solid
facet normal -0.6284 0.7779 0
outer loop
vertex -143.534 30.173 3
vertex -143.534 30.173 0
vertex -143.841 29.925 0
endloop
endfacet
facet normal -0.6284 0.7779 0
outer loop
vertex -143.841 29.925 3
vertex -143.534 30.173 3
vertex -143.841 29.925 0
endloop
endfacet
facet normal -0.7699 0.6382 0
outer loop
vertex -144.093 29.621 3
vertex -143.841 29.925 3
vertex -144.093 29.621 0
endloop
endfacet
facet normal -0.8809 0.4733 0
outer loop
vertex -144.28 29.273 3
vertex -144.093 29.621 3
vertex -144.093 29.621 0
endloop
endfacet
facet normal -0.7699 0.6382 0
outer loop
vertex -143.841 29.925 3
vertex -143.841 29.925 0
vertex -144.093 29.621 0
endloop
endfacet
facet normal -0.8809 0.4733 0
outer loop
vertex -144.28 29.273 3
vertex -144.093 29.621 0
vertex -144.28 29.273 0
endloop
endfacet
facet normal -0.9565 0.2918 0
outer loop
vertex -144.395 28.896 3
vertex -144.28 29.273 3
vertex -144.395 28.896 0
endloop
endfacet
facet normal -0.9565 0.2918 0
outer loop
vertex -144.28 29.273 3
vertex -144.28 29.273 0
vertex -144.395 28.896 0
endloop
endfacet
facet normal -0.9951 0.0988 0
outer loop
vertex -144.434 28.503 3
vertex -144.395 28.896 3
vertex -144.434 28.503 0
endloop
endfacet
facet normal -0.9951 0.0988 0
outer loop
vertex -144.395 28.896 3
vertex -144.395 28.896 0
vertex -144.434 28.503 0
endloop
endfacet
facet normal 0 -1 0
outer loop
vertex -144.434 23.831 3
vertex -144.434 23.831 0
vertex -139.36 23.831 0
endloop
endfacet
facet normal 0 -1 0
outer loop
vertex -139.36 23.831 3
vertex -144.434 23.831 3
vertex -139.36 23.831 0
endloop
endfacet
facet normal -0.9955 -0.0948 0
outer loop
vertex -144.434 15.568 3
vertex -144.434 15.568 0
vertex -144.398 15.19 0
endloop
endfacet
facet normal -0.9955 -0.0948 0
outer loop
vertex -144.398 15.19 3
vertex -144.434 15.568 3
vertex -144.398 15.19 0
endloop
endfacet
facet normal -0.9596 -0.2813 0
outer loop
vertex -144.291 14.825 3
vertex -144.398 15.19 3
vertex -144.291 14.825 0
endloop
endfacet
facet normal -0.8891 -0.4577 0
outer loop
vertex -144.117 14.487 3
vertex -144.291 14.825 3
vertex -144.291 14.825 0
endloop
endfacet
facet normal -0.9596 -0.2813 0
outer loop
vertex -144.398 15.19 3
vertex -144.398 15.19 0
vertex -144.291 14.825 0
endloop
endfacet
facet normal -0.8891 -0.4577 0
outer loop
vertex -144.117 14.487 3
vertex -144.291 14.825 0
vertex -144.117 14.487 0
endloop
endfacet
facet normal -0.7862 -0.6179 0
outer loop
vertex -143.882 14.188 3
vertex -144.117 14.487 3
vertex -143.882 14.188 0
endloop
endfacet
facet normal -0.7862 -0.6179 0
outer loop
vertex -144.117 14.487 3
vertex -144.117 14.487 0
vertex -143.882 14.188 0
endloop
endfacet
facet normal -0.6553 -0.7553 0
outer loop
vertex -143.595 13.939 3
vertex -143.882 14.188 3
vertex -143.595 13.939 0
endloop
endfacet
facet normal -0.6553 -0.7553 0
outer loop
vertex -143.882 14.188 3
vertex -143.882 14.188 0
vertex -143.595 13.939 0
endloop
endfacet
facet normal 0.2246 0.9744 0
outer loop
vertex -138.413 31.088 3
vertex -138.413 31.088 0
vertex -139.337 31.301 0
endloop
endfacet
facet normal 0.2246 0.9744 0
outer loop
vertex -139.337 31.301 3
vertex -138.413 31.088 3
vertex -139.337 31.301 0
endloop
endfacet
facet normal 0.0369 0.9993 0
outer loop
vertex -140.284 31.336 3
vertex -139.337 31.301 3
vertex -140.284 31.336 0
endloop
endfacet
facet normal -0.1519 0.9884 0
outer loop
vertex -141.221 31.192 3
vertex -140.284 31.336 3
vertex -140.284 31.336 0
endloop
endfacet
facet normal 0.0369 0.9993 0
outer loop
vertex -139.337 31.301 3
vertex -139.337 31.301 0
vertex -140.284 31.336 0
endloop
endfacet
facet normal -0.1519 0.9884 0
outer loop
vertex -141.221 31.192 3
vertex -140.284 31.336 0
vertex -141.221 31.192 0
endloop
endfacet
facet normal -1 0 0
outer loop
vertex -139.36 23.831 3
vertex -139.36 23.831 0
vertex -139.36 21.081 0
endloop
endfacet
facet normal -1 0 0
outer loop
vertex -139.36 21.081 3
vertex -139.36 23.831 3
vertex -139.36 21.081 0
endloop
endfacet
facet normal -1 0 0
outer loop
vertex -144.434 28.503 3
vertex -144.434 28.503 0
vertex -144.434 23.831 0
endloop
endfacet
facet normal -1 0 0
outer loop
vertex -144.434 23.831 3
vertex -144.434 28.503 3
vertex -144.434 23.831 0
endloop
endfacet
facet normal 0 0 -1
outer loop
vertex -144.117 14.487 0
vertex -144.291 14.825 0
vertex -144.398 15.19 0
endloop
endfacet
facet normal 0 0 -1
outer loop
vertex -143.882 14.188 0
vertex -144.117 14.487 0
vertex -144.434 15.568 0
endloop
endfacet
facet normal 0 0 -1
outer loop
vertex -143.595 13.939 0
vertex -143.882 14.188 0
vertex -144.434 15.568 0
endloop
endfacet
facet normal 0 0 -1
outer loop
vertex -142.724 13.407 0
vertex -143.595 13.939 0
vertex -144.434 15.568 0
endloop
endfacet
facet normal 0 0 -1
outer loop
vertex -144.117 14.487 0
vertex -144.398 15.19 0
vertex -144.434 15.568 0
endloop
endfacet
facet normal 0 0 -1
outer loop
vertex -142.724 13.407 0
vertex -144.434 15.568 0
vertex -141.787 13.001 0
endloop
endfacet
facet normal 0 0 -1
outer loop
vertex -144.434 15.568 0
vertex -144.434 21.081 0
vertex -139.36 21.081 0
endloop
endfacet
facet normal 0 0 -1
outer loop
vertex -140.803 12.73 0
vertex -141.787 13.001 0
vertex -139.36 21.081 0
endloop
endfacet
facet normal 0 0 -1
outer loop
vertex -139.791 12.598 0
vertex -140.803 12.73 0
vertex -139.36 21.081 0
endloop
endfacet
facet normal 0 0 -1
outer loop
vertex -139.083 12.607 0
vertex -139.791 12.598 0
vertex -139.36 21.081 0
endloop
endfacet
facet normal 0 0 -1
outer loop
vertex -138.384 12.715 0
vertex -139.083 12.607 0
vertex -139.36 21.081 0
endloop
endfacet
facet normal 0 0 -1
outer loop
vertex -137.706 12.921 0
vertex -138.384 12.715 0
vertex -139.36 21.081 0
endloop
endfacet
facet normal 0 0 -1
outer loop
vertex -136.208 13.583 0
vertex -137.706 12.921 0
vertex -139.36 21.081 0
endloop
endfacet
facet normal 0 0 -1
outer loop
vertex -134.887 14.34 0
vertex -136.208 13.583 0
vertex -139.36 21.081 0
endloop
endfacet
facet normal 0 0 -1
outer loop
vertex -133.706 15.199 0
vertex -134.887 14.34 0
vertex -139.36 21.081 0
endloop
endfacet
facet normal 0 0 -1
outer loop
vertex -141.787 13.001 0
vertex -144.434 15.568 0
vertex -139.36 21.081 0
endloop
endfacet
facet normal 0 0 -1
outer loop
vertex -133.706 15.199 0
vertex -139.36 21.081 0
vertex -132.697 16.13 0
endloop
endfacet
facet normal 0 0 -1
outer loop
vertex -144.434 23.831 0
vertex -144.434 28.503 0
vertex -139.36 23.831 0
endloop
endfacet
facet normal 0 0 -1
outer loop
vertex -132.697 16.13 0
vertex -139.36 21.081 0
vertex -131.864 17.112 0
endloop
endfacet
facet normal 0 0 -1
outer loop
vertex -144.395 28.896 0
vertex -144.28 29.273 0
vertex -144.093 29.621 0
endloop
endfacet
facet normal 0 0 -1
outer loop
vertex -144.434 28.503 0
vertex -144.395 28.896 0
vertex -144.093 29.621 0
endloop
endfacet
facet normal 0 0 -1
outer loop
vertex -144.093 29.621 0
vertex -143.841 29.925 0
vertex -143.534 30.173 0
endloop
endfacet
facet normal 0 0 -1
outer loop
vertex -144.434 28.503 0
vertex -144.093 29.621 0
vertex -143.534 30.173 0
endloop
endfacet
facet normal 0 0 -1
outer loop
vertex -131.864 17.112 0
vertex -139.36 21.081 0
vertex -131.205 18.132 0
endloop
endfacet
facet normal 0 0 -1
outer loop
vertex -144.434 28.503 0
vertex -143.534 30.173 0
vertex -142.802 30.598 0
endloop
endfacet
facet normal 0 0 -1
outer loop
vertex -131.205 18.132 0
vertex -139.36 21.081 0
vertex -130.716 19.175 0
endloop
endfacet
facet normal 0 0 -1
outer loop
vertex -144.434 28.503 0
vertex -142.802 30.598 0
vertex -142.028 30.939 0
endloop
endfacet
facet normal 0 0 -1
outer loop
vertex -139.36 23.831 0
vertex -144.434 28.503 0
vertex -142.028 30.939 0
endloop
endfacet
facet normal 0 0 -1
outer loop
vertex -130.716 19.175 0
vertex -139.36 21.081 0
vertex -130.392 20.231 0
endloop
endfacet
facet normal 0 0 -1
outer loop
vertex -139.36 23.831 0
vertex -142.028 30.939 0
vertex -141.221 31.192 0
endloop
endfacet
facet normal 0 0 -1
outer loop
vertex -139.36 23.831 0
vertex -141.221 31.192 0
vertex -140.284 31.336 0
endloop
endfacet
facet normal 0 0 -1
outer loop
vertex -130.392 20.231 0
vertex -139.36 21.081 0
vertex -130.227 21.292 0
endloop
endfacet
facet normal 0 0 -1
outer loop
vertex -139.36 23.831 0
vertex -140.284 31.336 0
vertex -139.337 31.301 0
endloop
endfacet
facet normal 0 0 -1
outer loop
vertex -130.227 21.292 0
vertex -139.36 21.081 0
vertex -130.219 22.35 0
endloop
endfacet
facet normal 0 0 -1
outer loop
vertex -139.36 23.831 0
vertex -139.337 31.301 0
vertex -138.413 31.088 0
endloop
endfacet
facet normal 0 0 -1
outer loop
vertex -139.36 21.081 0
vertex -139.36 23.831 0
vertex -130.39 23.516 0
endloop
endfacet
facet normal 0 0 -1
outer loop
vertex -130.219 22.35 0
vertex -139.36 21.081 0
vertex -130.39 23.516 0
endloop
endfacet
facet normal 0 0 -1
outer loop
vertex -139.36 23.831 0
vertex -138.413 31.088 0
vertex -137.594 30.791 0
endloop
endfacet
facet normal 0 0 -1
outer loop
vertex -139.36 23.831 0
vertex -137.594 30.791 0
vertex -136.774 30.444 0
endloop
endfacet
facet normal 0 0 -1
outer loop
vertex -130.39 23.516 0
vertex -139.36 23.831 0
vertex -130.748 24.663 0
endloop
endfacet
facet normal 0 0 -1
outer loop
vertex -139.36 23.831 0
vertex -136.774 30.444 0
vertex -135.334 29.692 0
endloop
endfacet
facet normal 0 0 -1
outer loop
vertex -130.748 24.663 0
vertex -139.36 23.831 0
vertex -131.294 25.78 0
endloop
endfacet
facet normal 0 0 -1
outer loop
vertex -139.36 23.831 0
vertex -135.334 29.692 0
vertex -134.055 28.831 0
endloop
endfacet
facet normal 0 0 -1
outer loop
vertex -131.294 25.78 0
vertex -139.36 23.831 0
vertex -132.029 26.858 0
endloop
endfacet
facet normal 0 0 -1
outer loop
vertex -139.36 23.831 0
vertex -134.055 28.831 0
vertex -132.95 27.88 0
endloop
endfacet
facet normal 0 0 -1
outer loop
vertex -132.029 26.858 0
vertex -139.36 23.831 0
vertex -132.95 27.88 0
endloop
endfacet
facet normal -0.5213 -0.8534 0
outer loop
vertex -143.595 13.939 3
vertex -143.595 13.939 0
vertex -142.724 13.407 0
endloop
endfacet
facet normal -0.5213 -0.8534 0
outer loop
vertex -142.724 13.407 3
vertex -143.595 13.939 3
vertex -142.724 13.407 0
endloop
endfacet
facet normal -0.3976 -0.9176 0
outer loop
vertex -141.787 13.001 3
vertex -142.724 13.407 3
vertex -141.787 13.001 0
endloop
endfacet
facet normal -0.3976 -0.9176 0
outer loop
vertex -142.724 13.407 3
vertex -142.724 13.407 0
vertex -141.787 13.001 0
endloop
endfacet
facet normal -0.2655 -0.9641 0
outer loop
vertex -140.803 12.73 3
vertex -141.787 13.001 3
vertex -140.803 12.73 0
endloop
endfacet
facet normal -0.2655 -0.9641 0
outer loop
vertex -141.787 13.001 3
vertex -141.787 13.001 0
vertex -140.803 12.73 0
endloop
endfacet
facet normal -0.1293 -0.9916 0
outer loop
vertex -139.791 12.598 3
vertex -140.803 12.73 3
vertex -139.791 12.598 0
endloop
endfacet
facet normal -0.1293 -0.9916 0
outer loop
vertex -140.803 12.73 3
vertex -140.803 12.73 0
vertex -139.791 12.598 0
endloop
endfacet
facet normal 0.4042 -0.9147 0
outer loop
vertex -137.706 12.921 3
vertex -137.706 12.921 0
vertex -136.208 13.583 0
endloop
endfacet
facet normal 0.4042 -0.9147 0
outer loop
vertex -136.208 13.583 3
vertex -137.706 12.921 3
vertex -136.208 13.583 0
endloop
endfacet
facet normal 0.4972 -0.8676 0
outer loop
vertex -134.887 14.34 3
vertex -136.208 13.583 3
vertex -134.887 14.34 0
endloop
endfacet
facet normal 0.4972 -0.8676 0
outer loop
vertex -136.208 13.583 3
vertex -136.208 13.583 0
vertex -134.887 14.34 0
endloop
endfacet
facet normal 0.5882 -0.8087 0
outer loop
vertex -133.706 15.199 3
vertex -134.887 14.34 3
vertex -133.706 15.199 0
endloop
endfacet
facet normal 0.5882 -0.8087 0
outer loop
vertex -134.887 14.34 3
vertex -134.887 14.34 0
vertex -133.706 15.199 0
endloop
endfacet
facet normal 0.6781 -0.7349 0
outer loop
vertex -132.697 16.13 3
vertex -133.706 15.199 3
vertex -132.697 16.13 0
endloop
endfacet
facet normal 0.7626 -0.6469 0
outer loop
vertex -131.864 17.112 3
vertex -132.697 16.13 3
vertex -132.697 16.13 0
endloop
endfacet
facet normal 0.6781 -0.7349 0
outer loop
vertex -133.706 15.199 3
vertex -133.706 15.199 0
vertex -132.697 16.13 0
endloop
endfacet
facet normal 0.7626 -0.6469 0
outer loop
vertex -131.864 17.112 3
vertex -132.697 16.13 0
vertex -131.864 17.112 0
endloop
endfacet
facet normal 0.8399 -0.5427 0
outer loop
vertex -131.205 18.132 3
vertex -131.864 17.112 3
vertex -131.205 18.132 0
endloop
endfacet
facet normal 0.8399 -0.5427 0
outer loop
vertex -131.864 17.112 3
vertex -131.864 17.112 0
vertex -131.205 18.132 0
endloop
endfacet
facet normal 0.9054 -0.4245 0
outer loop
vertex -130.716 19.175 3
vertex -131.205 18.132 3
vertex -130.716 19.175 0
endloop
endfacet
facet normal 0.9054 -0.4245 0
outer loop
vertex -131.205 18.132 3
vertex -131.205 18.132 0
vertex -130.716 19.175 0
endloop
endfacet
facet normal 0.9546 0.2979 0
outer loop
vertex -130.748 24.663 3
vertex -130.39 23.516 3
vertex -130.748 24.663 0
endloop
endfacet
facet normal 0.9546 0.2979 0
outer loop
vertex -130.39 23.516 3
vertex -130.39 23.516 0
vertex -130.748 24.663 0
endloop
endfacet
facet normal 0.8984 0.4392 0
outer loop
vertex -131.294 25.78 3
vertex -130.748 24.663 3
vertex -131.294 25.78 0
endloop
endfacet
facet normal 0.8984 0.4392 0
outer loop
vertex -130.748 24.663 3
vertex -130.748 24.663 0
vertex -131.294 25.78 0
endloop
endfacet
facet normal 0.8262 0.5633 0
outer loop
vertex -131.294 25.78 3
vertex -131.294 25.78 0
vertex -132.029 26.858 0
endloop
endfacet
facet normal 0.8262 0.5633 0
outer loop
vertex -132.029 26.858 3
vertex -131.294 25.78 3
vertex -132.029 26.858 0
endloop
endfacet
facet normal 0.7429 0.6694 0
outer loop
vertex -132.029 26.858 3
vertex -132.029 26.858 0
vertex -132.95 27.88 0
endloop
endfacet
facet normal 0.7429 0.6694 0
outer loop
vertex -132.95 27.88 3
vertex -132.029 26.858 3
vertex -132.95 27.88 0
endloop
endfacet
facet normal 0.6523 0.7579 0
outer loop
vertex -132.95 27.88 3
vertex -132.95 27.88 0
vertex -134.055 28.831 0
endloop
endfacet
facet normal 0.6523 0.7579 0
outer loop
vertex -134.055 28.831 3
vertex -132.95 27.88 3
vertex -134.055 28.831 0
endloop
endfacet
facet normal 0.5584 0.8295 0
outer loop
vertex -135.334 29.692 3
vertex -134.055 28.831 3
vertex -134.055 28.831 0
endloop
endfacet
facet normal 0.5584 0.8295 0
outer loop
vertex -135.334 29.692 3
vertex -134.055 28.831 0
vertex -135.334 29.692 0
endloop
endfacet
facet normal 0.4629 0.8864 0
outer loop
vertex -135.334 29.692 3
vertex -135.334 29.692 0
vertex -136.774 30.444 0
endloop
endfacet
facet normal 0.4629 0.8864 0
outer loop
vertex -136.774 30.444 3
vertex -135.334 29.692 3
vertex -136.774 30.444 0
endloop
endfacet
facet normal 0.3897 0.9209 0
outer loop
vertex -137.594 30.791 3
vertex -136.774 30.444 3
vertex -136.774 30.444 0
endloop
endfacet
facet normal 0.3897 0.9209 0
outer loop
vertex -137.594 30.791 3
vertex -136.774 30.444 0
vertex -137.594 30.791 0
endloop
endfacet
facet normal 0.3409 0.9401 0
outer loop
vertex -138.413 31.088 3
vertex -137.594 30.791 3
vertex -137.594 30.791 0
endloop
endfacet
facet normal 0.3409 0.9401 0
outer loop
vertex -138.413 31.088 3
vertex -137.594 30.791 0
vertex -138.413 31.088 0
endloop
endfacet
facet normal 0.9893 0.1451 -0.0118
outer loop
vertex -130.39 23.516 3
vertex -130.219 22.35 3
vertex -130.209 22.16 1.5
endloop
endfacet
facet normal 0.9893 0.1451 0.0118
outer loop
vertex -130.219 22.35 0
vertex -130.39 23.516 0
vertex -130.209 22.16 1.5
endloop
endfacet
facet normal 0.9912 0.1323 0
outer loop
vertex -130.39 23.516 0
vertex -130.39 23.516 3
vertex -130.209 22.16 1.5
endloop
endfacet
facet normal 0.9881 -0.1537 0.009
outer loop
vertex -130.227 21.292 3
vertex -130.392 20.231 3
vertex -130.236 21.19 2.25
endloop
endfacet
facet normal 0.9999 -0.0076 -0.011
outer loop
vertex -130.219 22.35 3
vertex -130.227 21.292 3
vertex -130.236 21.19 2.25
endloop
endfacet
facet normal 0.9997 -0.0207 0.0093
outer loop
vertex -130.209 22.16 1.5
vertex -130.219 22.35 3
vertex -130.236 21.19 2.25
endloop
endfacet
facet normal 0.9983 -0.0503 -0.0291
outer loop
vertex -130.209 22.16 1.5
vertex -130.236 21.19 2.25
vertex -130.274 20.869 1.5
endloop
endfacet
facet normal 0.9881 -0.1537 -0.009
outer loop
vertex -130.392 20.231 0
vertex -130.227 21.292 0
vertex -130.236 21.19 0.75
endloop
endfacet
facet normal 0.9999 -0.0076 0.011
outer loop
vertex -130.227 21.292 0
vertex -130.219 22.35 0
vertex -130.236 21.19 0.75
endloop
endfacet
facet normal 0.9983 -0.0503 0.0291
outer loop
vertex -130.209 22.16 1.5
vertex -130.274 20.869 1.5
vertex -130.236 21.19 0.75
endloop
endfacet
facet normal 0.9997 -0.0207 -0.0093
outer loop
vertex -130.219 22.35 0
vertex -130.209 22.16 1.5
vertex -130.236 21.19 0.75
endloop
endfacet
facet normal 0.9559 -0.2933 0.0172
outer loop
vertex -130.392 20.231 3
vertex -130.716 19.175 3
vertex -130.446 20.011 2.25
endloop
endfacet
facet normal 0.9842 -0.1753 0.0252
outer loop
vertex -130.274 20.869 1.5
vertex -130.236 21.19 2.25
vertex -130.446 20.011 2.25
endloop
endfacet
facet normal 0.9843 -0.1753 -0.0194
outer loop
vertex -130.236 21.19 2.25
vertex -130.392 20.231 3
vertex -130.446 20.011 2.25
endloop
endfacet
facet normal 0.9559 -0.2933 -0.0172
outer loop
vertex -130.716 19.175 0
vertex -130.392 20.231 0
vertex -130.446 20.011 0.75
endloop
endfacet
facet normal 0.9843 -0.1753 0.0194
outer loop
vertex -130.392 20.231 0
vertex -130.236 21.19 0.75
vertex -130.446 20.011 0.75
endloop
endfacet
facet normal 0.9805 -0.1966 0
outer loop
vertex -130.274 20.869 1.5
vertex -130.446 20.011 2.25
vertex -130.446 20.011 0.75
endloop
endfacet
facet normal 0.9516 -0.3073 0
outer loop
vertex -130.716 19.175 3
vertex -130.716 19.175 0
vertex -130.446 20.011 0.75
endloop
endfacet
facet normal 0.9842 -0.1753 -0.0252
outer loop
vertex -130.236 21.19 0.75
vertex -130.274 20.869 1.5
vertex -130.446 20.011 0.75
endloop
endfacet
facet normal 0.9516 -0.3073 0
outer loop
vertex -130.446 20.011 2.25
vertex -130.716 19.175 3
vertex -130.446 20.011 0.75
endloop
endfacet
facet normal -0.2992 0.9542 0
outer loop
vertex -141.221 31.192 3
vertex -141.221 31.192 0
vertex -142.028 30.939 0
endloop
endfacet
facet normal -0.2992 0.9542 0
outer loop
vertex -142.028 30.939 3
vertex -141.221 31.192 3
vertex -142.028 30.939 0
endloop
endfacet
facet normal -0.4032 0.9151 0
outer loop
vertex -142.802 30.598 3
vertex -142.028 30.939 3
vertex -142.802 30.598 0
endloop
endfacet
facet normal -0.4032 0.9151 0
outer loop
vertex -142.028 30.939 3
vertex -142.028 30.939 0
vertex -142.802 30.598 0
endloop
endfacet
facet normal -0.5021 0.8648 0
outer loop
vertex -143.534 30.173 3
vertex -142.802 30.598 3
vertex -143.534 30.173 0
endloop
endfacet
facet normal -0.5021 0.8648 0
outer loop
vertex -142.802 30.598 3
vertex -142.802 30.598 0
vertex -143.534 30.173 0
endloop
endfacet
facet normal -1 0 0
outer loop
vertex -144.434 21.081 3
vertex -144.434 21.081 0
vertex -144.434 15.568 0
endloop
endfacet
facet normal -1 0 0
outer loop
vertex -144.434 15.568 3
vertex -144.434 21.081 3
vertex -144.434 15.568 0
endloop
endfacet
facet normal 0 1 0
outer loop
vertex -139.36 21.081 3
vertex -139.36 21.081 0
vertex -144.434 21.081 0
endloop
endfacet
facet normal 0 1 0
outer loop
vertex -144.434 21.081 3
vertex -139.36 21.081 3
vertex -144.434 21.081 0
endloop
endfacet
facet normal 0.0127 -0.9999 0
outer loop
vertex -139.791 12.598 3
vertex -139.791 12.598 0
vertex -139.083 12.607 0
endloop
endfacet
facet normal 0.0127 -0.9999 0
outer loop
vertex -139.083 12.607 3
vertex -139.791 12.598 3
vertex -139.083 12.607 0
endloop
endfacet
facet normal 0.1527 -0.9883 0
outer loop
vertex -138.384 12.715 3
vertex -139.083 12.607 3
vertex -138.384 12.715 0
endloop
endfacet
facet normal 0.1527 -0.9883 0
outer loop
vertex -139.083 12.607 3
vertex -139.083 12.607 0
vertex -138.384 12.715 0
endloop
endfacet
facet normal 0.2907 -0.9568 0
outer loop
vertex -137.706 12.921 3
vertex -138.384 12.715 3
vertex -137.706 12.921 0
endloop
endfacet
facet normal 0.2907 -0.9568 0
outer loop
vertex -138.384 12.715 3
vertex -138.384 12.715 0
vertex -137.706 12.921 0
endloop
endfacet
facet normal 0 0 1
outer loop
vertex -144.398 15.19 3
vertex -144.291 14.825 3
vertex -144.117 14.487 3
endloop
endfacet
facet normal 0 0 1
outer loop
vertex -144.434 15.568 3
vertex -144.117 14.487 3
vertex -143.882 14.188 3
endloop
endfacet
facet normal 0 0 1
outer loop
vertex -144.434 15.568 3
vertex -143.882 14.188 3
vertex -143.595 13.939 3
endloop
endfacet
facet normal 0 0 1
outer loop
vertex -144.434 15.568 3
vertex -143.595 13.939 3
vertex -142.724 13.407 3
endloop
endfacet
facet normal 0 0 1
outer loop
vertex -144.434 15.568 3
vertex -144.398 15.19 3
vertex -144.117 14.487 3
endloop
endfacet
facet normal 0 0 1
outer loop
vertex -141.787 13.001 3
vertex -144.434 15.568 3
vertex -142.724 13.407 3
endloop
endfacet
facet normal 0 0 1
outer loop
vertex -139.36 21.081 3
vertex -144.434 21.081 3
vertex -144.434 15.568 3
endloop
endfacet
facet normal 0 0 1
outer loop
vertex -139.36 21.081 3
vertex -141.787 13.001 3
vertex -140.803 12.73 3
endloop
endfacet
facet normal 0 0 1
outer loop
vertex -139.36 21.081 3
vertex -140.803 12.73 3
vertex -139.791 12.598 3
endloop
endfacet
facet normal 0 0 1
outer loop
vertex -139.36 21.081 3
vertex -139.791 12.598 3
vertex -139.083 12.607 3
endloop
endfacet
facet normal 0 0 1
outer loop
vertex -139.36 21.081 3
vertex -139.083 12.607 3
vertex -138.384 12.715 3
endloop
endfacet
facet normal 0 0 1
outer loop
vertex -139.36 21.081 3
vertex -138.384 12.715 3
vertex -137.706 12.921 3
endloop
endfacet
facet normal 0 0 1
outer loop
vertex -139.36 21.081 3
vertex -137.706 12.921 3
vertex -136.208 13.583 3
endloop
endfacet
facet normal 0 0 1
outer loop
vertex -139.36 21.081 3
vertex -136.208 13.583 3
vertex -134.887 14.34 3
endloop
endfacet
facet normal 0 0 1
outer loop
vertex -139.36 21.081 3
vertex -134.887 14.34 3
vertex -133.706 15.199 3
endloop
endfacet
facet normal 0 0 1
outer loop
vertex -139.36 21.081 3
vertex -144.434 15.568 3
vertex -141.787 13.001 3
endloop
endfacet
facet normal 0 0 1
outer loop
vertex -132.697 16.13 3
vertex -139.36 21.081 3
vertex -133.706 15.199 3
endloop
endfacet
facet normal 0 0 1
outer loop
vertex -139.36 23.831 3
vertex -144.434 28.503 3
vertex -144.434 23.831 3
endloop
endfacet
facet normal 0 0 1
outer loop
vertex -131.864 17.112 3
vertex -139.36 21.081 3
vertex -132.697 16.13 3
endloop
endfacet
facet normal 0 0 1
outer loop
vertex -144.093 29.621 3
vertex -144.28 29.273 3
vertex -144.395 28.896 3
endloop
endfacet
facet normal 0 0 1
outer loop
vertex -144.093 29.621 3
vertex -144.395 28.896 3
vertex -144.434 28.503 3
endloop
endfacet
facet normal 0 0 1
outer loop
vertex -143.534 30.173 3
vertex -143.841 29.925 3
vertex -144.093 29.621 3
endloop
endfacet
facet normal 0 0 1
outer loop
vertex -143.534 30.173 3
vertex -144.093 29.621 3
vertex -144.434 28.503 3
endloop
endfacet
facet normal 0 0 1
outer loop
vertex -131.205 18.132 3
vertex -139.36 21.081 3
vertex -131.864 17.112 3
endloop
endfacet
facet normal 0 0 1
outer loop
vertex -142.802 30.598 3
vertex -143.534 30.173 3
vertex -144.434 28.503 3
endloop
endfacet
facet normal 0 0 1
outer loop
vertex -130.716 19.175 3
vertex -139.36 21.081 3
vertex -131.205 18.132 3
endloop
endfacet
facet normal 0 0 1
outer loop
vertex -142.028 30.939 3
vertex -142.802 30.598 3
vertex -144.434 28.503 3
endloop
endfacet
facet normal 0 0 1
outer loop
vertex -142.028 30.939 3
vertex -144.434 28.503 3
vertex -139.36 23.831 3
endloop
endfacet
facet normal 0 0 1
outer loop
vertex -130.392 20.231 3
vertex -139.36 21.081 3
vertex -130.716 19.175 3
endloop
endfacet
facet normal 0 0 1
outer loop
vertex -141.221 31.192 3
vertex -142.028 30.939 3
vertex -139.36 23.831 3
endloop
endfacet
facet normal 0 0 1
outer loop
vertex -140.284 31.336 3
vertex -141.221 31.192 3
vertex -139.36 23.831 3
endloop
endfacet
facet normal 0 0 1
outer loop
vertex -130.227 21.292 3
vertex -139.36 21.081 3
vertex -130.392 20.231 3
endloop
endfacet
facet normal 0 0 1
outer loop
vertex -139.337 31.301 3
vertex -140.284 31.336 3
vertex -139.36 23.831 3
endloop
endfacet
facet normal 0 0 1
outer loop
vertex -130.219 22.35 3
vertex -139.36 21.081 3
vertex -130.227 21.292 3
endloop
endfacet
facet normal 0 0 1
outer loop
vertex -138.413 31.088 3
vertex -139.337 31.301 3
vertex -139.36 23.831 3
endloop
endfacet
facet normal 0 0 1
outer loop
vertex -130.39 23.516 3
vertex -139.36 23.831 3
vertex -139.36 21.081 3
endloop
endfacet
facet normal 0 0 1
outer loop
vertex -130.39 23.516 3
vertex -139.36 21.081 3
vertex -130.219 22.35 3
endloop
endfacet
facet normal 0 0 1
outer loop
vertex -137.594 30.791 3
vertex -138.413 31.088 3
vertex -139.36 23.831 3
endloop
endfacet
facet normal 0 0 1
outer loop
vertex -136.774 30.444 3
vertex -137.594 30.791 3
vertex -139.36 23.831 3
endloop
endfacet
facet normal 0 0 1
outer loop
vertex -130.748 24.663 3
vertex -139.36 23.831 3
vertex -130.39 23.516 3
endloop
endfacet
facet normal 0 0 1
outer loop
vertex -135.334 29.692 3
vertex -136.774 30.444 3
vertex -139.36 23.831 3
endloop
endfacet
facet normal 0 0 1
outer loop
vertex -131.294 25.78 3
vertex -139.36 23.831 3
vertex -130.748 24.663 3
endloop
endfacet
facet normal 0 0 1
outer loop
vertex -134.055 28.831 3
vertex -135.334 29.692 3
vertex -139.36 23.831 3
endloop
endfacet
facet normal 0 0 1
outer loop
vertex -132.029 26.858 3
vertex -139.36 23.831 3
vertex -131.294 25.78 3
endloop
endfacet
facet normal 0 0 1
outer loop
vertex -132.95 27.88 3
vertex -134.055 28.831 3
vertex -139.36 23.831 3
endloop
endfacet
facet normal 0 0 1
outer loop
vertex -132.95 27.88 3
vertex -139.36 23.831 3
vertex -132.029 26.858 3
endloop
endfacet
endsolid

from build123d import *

# Parameters (mm, degrees)
SALIENTE_EXTRUIR1_DEPTH = 3


with BuildPart() as part:
    # Croquis1 → Saliente-Extruir1 (new body)
    with BuildSketch(Plane.XY):
        with BuildLine():
            Line((-144.434437963, 23.831289655), (-139.359958663, 23.831289655))
            Line((-139.359958663, 23.831289655), (-139.359958663, 21.081289655))
            Line((-139.359958663, 21.081289655), (-144.434437963, 21.081289655))
            Line((-144.434437963, 21.081289655), (-144.434437963, 15.568266464))
            ThreePointArc((-144.434437963, 15.568266464), (-144.212105673, 14.651807238), (-143.59454045, 13.93910649))
            ThreePointArc((-143.59454045, 13.93910649), (-141.78704859, 13.000742202), (-139.79067514, 12.598191072))
            ThreePointArc((-139.79067514, 12.598191072), (-138.731334246, 12.648248724), (-137.706379935, 12.920604299))
            add(Edge.make_bspline(
                [(-137.706379935, 12.920604299), (-112.690499862, 22.507679551), (-138.413124465, 31.087686647)],
                knots=[5.204835954, 5.204835954, 5.204835954, 7.417095332, 7.417095332, 7.417095332], degree=2, weights=[1, 0.44812481, 1]))
            ThreePointArc((-138.413124465, 31.087686647), (-139.809326003, 31.341133977), (-141.220500745, 31.192136898))
            ThreePointArc((-141.220500745, 31.192136898), (-142.419935003, 30.779687584), (-143.533969481, 30.173317932))
            ThreePointArc((-143.533969481, 30.173317932), (-144.194986604, 29.451610375), (-144.434437963, 28.502680197))
            Line((-144.434437963, 28.502680197), (-144.434437963, 23.831289655))
        make_face()
    extrude(amount=SALIENTE_EXTRUIR1_DEPTH)


solid = part.part
